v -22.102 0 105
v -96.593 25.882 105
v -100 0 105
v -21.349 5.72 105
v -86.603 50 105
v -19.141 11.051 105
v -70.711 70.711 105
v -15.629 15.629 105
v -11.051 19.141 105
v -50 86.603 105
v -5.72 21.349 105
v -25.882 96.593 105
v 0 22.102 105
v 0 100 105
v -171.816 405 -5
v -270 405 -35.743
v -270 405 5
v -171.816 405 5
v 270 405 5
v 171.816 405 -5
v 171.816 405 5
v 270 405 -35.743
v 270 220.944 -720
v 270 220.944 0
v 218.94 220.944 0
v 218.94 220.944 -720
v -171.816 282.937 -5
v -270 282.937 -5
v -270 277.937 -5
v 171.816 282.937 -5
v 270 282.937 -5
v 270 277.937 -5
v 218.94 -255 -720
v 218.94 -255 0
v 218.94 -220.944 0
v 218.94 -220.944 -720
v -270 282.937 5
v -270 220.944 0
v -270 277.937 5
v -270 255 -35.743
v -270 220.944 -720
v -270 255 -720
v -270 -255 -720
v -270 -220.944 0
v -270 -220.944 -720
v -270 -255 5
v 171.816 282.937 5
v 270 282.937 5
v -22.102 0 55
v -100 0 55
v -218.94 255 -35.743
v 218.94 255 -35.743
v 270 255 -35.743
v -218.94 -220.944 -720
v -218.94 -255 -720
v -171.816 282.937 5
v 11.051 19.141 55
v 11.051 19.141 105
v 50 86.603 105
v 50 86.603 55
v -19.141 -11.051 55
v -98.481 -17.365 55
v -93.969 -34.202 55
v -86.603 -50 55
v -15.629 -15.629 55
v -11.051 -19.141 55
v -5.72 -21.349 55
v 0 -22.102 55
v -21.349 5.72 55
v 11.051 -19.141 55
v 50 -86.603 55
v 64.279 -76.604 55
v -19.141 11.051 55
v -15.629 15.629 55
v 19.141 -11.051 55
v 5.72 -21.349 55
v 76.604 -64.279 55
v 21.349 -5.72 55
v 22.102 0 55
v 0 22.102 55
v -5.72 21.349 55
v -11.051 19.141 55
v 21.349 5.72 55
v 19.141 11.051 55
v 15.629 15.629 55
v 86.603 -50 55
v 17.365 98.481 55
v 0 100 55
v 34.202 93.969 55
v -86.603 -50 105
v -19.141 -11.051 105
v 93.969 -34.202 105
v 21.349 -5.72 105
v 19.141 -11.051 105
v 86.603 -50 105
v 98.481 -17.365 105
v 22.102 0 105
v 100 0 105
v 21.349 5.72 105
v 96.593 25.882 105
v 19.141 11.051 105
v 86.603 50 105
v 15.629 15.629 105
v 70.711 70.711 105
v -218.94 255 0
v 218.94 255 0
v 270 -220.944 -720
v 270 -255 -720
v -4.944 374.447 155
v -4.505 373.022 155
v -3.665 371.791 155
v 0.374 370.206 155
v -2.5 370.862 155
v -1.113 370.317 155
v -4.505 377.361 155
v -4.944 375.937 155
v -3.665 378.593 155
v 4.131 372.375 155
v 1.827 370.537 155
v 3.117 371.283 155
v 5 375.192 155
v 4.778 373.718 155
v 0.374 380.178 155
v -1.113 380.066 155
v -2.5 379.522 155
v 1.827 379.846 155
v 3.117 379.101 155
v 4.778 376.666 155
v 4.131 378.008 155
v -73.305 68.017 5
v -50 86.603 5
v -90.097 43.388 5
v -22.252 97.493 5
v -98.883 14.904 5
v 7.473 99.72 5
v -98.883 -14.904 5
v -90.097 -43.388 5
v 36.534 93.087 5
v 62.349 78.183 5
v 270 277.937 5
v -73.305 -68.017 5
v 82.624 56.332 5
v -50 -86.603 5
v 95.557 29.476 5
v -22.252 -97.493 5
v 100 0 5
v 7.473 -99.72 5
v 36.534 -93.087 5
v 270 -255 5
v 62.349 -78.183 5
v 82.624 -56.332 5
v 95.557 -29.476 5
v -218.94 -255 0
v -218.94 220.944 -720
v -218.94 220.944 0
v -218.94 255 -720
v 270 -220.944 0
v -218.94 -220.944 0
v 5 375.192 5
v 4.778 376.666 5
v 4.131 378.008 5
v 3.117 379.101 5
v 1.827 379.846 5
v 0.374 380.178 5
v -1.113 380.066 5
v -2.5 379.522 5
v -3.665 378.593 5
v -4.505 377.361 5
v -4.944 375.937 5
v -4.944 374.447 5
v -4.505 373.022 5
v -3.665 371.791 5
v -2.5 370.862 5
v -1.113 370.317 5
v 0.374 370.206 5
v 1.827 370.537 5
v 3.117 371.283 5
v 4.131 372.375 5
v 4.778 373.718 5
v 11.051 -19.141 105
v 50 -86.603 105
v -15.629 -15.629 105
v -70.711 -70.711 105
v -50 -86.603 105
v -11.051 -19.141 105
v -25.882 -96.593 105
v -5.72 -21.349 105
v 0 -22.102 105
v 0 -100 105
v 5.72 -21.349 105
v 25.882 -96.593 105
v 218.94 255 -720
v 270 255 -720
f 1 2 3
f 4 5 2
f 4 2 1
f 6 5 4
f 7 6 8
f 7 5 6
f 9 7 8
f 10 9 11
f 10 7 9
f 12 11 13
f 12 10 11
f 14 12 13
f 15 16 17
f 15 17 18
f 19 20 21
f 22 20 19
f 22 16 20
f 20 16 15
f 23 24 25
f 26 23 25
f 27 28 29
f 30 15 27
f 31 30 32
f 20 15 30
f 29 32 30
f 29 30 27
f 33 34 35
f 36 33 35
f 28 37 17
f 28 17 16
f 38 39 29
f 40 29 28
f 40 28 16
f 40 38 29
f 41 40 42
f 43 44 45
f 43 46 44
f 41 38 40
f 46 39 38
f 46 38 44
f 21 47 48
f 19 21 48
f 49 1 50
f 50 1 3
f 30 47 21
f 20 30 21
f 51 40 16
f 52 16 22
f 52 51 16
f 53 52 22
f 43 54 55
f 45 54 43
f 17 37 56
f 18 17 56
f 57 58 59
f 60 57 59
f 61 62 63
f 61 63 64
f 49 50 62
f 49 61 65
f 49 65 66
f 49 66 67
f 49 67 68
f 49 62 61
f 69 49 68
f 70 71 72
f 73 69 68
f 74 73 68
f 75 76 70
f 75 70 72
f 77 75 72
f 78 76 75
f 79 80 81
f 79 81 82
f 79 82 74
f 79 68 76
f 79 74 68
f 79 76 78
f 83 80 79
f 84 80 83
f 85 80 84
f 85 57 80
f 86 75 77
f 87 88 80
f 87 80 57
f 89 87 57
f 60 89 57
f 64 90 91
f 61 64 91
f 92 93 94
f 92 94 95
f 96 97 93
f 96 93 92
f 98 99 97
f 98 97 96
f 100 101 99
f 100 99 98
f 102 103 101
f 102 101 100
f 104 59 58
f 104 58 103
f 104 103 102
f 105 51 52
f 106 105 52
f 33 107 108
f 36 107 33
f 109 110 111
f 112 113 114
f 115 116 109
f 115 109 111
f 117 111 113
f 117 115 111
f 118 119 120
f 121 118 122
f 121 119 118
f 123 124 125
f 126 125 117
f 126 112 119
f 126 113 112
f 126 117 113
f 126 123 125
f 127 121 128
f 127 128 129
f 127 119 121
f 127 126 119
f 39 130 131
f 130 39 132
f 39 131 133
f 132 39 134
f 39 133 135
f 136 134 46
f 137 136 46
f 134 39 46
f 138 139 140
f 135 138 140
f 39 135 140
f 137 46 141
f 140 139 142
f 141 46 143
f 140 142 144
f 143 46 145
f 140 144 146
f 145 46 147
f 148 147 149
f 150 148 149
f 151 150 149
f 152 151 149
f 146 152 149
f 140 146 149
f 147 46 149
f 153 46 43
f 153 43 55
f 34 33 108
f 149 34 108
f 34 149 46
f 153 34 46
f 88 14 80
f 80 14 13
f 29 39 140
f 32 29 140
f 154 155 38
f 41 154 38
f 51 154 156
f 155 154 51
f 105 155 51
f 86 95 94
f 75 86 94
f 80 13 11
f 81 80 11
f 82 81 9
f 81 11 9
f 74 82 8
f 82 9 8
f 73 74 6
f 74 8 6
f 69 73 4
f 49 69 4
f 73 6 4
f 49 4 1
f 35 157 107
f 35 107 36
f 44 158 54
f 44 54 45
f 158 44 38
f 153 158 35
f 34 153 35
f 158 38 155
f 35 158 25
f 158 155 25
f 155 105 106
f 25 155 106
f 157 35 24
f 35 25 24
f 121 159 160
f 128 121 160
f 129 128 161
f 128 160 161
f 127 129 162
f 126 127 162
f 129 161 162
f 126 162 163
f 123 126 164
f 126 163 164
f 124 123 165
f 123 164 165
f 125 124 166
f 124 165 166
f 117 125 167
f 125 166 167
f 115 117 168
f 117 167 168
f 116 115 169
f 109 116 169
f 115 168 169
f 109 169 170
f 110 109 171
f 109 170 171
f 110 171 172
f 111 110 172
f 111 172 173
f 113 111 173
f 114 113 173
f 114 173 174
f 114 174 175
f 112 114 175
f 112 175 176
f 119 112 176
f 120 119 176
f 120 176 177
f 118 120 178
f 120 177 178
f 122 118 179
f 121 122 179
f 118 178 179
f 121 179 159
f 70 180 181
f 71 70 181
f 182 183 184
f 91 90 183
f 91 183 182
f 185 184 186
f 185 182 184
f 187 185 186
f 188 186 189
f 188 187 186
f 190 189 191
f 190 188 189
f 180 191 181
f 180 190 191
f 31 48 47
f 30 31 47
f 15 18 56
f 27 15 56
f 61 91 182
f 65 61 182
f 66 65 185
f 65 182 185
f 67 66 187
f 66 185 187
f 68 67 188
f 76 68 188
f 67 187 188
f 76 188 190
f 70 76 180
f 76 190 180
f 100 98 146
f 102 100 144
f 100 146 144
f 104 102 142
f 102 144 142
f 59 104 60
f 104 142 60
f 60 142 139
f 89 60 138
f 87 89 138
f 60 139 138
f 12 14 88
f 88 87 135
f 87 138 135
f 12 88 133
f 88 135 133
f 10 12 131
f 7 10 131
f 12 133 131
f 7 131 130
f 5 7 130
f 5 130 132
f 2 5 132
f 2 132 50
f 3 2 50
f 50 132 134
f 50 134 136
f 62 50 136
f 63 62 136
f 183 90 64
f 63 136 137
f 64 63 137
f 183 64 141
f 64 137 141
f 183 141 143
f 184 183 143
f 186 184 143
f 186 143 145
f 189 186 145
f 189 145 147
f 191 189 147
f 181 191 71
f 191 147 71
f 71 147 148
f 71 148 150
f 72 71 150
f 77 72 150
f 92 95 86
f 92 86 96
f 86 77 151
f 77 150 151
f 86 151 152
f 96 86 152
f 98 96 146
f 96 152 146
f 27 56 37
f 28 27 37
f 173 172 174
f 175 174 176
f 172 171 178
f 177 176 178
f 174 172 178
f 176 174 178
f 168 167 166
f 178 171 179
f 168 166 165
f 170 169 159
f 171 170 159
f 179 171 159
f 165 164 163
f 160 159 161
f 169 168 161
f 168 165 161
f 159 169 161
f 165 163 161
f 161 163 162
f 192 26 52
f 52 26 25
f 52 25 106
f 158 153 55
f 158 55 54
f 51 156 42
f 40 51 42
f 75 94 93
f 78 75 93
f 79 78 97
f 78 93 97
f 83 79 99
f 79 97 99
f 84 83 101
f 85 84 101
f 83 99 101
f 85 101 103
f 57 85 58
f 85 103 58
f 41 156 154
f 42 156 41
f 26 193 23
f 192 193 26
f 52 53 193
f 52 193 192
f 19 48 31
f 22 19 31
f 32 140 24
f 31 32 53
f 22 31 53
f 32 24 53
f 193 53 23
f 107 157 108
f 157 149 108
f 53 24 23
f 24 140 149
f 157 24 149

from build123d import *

# Parameters (mm, degrees)
SKETCH1_W           = 540
SKETCH1_H           = 510
BOSS_EXTRUDE1_DEPTH = 5
SKETCH2_W           = 51.059777949
SKETCH2_H           = 34.055748457
BOSS_EXTRUDE2_DEPTH = 720
SKETCH3_R           = 100
BOSS_EXTRUDE3_DEPTH = 100
SKETCH4_W           = 540
SKETCH4_H           = 40.743294896
BOSS_EXTRUDE4_DEPTH = 150
SKETCH5_R           = 5
BOSS_EXTRUDE5_DEPTH = 150
CUT_EXTRUDE1_DEPTH  = 10
CUT_EXTRUDE2_DEPTH  = 50


with BuildPart() as part:
    # Sketch1 → Boss-Extrude1 (new body)
    with BuildSketch(Plane.XY):
        Rectangle(SKETCH1_W, SKETCH1_H)
    extrude(amount=BOSS_EXTRUDE1_DEPTH)

    # Sketch2 → Boss-Extrude2 (add)
    with BuildSketch(Plane(origin=(0, 0, 0), x_dir=(-1, 0, 0), z_dir=(0, 0, -1))):
        with Locations((244.470111025, 237.972125772)):
            Rectangle(SKETCH2_W, SKETCH2_H)
        with Locations((-244.470111025, 237.972125772)):
            Rectangle(SKETCH2_W, SKETCH2_H)
        with Locations((244.470111025, -237.972125772)):
            Rectangle(SKETCH2_W, SKETCH2_H)
        with Locations((-244.470111025, -237.972125772)):
            Rectangle(SKETCH2_W, SKETCH2_H)
    extrude(amount=BOSS_EXTRUDE2_DEPTH)

    # Sketch3 → Boss-Extrude3 (add)
    with BuildSketch(Plane.XY.offset(5)):
        Circle(SKETCH3_R)
    extrude(amount=BOSS_EXTRUDE3_DEPTH)

    # Sketch4 → Boss-Extrude4 (add)
    with BuildSketch(Plane(origin=(0, 255, 0), x_dir=(1, 0, 0), z_dir=(0, 1, 0))):
        with Locations((0, 15.371647448)):
            Rectangle(SKETCH4_W, SKETCH4_H)
    extrude(amount=BOSS_EXTRUDE4_DEPTH)

    # Sketch5 → Boss-Extrude5 (add)
    with BuildSketch(Plane.XY.offset(5)):
        with Locations((0, 375.191829561)):
            Circle(SKETCH5_R)
    extrude(amount=BOSS_EXTRUDE5_DEPTH)

    # Sketch6 → Cut-Extrude1 (cut)
    with BuildSketch(Plane.XY.offset(5)):
        Polygon((-171.816057956, 405), (-171.816057956, 282.937457133), (-270, 282.937457133), (-270, 277.937457133), (270, 277.937457133), (270, 282.937457133), (171.816057956, 282.937457133), (171.816057956, 405), align=None)
    extrude(amount=-CUT_EXTRUDE1_DEPTH, mode=Mode.SUBTRACT)


with BuildPart() as cut_extrude1_piece_1:
    # of the separate pieces the step leaves, piece 1, a body of its own (cut_extrude1_pieces)
    add(part.part.solids().sort_by_distance((270, -255, 5))[0])

    # Sketch7 → Cut-Extrude2 (cut)
    with BuildSketch(Plane.XY.offset(105)):
        with BuildLine():
            Line((0, 100), (0, 22.102227925))
            ThreePointArc((0, 22.102227925), (-15.628635245, 15.628635245), (-22.102227925, 0))
            Line((-22.102227925, 0), (-100, 0))
            ThreePointArc((-100, 0), (-96.592582629, -25.88190451), (-86.602540378, -50))
            Line((-86.602540378, -50), (-19.141090864, -11.051113963))
            ThreePointArc((-19.141090864, -11.051113963), (-5.720477526, -21.349112772), (11.051113963, -19.141090864))
            Line((11.051113963, -19.141090864), (50, -86.602540378))
            ThreePointArc((50, -86.602540378), (70.710678119, -70.710678119), (86.602540378, -50))
            Line((86.602540378, -50), (19.141090864, -11.051113963))
            ThreePointArc((19.141090864, -11.051113963), (21.349112772, 5.720477526), (11.051113963, 19.141090864))
            Line((11.051113963, 19.141090864), (50, 86.602540378))
            ThreePointArc((50, 86.602540378), (25.88190451, 96.592582629), (0, 100))
        make_face()
    extrude(amount=-CUT_EXTRUDE2_DEPTH, mode=Mode.SUBTRACT)


with BuildPart() as cut_extrude1_piece_2:
    # of the separate pieces the step leaves, piece 2, a body of its own (cut_extrude1_pieces)
    add(part.part.solids().sort_by_distance((5, 375.191829561, 5))[0])


solid = Compound([cut_extrude1_piece_1.part, cut_extrude1_piece_2.part])
